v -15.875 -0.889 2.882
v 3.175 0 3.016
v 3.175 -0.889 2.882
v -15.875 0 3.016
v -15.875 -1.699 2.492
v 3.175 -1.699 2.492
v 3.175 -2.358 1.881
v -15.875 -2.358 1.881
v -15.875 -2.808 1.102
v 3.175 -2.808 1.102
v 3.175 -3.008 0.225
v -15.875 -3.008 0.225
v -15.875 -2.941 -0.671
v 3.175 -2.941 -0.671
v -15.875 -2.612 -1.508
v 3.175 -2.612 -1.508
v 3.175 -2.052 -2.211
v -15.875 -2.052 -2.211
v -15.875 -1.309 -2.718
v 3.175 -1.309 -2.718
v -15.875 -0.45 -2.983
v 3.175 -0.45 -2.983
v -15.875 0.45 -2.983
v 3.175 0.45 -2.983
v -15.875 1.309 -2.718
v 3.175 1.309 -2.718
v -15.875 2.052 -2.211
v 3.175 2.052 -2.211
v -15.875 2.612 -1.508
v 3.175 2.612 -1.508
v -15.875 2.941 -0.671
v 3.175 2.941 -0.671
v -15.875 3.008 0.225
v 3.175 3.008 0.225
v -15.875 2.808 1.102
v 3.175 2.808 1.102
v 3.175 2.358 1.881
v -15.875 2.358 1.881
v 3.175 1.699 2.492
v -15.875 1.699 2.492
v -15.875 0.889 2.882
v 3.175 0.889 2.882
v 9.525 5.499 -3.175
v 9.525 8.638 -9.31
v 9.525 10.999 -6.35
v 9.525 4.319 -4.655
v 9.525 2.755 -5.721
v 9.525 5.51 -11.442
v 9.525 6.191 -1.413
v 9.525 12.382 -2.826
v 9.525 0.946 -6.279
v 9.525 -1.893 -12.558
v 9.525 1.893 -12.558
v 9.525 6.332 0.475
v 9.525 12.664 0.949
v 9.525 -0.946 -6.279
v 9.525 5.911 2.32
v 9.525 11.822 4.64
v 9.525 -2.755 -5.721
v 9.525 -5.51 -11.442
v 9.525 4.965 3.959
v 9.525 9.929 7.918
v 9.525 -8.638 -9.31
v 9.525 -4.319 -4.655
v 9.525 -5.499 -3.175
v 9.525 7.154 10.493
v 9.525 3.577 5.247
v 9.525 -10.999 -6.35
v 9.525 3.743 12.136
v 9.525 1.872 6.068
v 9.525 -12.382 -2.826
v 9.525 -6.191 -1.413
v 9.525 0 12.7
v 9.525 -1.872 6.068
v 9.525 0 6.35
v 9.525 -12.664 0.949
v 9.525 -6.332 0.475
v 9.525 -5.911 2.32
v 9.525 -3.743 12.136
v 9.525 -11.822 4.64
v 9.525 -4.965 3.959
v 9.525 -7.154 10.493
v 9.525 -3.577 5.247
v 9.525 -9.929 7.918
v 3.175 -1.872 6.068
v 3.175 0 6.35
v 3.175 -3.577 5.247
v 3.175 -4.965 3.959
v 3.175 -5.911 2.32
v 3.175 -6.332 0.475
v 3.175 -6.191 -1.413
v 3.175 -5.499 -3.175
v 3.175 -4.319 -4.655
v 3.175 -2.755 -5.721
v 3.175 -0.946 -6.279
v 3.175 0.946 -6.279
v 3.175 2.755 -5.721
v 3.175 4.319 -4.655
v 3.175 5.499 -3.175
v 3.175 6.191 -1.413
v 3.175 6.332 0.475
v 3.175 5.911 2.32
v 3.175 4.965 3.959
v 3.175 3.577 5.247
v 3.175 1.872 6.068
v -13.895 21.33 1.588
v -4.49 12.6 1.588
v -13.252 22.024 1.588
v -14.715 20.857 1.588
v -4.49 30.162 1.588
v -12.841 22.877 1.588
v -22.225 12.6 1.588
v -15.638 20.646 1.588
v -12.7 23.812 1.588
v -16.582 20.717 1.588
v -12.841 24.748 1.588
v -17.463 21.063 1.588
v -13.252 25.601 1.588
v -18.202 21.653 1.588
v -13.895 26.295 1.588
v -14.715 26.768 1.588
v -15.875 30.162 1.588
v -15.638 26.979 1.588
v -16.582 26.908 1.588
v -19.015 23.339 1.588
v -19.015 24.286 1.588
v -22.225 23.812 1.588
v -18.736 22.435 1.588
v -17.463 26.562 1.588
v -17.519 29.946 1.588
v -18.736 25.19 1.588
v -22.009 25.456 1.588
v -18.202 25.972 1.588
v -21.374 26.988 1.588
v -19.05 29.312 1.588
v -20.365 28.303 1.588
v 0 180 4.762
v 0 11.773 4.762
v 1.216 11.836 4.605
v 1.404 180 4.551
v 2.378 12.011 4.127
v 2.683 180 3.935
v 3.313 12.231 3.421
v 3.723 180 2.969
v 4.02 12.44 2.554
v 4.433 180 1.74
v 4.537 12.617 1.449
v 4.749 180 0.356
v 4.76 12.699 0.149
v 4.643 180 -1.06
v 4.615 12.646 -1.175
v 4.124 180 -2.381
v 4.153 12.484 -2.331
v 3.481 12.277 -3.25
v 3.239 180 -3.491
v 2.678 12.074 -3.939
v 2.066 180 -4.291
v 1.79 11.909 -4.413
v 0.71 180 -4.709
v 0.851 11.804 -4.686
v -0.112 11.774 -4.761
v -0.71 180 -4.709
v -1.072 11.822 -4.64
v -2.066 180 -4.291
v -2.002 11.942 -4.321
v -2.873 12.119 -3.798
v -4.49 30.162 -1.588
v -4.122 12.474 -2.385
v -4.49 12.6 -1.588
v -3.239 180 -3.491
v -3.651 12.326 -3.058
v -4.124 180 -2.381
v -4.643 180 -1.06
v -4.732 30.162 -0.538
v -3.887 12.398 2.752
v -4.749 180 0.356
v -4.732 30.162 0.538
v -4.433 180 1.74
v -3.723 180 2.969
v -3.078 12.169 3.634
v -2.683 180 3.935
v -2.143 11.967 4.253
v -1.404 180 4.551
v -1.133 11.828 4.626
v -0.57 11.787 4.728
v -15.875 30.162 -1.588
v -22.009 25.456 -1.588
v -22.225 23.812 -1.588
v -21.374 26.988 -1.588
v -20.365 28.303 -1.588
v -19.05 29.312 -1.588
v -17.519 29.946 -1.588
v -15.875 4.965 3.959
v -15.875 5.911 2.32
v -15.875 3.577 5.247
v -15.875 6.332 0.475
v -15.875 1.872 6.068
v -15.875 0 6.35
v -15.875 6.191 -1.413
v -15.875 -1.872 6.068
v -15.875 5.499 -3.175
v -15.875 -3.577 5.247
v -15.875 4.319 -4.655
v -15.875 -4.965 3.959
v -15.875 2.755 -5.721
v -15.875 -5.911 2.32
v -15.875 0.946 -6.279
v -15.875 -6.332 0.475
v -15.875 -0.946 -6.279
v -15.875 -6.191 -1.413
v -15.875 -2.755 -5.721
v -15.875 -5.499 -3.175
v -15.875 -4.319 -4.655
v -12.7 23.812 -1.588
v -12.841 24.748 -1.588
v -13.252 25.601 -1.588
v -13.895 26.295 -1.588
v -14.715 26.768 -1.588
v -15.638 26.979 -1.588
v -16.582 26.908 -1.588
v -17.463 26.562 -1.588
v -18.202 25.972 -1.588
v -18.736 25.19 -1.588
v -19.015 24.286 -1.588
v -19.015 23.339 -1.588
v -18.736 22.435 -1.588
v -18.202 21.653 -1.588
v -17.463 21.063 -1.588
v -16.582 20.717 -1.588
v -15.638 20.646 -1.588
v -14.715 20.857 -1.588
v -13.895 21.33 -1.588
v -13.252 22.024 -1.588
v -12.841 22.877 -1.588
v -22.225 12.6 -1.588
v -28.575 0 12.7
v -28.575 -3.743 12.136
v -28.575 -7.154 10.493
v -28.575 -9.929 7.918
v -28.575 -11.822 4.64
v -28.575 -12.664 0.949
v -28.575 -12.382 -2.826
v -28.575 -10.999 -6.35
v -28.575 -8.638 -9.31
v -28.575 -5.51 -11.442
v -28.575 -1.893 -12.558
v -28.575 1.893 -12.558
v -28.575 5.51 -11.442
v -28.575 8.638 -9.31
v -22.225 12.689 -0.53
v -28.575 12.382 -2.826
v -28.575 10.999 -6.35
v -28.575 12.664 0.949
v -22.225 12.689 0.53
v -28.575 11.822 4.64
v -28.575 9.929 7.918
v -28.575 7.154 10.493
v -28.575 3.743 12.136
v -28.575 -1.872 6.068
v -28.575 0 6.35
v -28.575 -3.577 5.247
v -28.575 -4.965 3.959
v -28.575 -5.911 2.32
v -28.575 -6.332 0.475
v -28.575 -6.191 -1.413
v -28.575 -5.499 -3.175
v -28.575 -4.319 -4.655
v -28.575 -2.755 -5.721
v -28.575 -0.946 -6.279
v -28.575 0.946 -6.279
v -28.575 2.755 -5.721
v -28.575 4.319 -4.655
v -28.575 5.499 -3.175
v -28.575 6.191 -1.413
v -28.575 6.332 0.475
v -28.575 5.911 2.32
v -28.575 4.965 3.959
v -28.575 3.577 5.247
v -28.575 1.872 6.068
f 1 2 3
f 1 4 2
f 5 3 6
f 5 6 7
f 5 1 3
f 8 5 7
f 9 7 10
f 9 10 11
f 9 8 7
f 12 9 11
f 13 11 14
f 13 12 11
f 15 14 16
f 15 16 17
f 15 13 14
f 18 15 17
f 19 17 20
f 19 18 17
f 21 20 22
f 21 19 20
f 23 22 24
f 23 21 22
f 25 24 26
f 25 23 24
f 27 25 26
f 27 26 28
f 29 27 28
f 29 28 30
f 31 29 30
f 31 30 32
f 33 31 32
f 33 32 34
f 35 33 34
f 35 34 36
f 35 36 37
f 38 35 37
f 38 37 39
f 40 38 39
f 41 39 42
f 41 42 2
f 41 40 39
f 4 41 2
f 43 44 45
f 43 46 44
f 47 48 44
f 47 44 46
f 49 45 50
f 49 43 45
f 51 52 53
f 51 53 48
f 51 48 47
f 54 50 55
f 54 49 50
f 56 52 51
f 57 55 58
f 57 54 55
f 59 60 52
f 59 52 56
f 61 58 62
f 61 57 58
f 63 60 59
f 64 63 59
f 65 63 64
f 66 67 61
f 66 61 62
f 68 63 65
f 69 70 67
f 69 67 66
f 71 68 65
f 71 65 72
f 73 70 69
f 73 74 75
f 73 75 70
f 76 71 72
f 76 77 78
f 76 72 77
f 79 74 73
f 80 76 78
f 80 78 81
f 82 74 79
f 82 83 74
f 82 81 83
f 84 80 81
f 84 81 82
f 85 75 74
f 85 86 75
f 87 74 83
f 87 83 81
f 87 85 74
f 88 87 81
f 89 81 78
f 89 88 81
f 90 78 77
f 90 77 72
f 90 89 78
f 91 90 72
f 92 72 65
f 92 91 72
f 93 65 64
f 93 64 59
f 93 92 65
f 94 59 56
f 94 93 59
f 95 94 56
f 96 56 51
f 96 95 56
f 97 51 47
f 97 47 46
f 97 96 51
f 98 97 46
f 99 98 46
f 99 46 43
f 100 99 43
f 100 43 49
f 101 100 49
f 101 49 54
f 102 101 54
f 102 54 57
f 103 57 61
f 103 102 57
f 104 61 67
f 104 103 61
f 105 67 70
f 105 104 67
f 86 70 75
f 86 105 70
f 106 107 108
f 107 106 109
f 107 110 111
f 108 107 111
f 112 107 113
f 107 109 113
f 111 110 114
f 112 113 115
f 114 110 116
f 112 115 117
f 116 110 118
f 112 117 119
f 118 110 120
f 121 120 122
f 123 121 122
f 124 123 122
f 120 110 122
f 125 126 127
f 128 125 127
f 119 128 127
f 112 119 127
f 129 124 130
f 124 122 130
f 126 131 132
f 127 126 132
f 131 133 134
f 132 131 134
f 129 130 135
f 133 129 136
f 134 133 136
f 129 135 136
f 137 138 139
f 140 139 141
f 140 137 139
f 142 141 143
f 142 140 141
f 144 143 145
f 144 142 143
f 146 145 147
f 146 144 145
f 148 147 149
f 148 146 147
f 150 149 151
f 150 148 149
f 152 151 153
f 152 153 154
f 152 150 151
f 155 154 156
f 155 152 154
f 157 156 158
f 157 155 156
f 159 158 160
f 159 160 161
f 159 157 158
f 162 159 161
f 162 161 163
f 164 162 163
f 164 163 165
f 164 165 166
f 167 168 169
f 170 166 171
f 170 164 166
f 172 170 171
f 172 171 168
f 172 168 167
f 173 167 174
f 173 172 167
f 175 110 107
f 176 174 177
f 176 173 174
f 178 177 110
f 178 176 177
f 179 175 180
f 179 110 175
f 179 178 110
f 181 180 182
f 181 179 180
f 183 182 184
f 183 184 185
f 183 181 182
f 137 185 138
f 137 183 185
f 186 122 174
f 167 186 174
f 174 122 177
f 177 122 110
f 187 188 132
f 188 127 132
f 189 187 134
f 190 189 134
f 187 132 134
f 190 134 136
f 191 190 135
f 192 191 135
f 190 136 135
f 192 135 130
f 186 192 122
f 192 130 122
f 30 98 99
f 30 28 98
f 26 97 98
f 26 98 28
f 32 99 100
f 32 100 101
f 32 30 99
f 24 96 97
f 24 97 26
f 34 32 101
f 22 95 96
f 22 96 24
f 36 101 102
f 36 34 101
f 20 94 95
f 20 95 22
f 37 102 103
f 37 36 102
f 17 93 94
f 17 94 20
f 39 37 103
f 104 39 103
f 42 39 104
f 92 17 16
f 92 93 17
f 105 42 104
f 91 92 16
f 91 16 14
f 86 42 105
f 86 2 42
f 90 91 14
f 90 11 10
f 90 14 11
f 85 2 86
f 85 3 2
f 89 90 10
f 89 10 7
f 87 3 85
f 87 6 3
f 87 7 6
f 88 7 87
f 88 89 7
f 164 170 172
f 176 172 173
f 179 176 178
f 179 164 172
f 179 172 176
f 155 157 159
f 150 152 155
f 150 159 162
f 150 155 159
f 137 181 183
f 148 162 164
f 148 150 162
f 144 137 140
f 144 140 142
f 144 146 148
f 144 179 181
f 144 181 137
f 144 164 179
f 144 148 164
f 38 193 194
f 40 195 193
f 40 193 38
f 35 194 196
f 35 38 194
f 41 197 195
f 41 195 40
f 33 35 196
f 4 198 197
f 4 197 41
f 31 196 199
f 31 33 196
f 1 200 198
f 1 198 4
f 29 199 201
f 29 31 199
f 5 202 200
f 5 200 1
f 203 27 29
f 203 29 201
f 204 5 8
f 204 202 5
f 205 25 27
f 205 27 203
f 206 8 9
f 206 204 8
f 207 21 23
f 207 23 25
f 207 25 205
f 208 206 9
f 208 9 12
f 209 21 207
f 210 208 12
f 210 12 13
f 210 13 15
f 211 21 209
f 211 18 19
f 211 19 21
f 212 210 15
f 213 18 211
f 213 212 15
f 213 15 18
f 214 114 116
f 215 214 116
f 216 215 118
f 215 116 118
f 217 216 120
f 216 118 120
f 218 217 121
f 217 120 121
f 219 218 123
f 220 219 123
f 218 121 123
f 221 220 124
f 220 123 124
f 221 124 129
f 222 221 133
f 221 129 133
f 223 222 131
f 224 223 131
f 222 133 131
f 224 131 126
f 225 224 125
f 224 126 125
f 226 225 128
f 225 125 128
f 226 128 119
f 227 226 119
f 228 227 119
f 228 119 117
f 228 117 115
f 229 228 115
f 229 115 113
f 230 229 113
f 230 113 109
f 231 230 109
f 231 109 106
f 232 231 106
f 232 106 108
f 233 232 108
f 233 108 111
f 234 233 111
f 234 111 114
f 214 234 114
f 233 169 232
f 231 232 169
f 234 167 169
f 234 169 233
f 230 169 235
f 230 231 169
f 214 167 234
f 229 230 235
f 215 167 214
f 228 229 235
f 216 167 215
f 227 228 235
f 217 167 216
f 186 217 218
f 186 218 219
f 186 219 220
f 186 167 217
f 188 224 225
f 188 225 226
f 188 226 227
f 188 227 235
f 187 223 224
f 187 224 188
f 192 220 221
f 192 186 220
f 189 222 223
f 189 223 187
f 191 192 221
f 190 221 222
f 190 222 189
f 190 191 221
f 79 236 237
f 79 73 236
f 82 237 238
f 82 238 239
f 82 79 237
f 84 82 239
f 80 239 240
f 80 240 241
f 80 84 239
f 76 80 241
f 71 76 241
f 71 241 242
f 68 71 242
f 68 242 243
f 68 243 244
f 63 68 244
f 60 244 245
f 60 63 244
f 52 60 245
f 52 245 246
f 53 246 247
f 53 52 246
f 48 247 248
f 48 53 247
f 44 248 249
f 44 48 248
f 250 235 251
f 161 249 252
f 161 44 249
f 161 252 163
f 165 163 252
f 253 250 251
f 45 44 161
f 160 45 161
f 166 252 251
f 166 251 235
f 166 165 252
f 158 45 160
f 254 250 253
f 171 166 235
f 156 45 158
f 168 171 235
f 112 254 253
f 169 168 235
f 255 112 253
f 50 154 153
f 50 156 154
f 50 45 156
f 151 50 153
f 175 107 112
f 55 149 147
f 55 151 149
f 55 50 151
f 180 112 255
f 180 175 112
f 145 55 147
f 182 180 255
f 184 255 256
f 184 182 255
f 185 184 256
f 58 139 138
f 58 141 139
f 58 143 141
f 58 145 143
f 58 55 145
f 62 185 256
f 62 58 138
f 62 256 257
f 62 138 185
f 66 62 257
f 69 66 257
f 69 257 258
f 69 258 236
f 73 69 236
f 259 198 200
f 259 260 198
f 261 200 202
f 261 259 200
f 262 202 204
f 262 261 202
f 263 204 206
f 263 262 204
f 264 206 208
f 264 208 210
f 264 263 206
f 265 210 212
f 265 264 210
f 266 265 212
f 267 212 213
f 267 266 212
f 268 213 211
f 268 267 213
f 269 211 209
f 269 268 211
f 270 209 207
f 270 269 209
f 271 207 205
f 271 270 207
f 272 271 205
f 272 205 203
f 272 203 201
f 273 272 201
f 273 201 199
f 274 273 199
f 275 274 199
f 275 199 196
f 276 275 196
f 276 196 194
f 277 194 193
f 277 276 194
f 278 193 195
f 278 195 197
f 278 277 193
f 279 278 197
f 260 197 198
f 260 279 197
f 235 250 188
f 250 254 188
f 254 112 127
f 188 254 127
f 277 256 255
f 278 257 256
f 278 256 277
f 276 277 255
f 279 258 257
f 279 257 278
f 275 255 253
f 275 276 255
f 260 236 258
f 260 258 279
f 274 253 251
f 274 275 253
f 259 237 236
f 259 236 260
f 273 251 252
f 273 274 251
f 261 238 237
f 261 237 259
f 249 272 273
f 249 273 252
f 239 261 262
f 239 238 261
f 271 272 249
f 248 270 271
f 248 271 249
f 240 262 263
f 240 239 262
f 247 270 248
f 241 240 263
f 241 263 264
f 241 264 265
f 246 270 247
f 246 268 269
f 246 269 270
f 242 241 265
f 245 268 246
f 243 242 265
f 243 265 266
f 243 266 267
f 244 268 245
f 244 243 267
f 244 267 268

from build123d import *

# Parameters (mm, degrees)
SKETCH3_R                       = 4.7625
BOSS_EXTRUDE1_DEPTH             = 150
BOSS_EXTRUDE1_DIRECTION_2_REACH = 54.926
BOSS_EXTRUDE2_DEPTH             = 1.5875
SKETCH5_R                       = 3.175
CUT_EXTRUDE1_DEPTH              = 183.813192428


with BuildPart() as part:
    # Sketch1 → Revolve1 (revolve)
    with BuildSketch(Plane.XY, mode=Mode.PRIVATE) as revolve1_sk:
        Polygon((-28.575, 12.7), (9.525, 12.7), (9.525, 6.35), (3.175, 6.35), (3.175, 3.01625), (-15.875, 3.01625), (-15.875, 6.35), (-28.575, 6.35), align=None)
    revolve(revolve1_sk.sketch.rotate(Axis((-58.643350072, 0, 0), (1, 0, 0)), 90), axis=Axis((-58.643350072, 0, 0), (1, 0, 0)))

    # Sketch3 → Boss-Extrude1 (add)
    with BuildSketch(Plane(origin=(0, 30, 0), x_dir=(-1, 0, 0), z_dir=(0, 1, 0))):
        with Locations(Location((0, 0, 0), (0, 0, 90))):
            Circle(SKETCH3_R)
    extrude(amount=BOSS_EXTRUDE1_DEPTH)

    # Sketch3 → Boss-Extrude1 direction 2 (add, up to next)
    with BuildSketch(Plane(origin=(0, 30, 0), x_dir=(-1, 0, 0), z_dir=(0, 1, 0)), mode=Mode.PRIVATE) as boss_extrude1_direction_2_sk1:
        with Locations(Location((0, 0, 0), (0, 0, 90))):
            Circle(SKETCH3_R)
    boss_extrude1_direction_2_tool1 = extrude(boss_extrude1_direction_2_sk1.sketch, amount=-BOSS_EXTRUDE1_DIRECTION_2_REACH, mode=Mode.PRIVATE) - part.part
    add(boss_extrude1_direction_2_tool1.solids().sort_by_distance((0, 30, 0))[0])

    # Sketch4 → Boss-Extrude2 (add, symmetric)
    with BuildSketch(Plane.XY):
        with BuildLine():
            Line((-3.175, 11.1125), (-22.225, 11.1125))
            Line((-22.225, 11.1125), (-22.225, 23.8125))
            ThreePointArc((-22.225, 23.8125), (-20.365128061, 28.302628061), (-15.875, 30.1625))
            Line((-15.875, 30.1625), (-3.175, 30.1625))
            Line((-3.175, 30.1625), (-3.175, 11.1125))
        make_face()
    extrude(amount=BOSS_EXTRUDE2_DEPTH, both=True)

    # Sketch5 → Cut-Extrude1 (cut, through all)
    with BuildSketch(Plane.XY.offset(1.5875)):
        with Locations((-15.875, 23.8125)):
            Circle(SKETCH5_R)
    extrude(amount=-CUT_EXTRUDE1_DEPTH, mode=Mode.SUBTRACT)


solid = part.part
